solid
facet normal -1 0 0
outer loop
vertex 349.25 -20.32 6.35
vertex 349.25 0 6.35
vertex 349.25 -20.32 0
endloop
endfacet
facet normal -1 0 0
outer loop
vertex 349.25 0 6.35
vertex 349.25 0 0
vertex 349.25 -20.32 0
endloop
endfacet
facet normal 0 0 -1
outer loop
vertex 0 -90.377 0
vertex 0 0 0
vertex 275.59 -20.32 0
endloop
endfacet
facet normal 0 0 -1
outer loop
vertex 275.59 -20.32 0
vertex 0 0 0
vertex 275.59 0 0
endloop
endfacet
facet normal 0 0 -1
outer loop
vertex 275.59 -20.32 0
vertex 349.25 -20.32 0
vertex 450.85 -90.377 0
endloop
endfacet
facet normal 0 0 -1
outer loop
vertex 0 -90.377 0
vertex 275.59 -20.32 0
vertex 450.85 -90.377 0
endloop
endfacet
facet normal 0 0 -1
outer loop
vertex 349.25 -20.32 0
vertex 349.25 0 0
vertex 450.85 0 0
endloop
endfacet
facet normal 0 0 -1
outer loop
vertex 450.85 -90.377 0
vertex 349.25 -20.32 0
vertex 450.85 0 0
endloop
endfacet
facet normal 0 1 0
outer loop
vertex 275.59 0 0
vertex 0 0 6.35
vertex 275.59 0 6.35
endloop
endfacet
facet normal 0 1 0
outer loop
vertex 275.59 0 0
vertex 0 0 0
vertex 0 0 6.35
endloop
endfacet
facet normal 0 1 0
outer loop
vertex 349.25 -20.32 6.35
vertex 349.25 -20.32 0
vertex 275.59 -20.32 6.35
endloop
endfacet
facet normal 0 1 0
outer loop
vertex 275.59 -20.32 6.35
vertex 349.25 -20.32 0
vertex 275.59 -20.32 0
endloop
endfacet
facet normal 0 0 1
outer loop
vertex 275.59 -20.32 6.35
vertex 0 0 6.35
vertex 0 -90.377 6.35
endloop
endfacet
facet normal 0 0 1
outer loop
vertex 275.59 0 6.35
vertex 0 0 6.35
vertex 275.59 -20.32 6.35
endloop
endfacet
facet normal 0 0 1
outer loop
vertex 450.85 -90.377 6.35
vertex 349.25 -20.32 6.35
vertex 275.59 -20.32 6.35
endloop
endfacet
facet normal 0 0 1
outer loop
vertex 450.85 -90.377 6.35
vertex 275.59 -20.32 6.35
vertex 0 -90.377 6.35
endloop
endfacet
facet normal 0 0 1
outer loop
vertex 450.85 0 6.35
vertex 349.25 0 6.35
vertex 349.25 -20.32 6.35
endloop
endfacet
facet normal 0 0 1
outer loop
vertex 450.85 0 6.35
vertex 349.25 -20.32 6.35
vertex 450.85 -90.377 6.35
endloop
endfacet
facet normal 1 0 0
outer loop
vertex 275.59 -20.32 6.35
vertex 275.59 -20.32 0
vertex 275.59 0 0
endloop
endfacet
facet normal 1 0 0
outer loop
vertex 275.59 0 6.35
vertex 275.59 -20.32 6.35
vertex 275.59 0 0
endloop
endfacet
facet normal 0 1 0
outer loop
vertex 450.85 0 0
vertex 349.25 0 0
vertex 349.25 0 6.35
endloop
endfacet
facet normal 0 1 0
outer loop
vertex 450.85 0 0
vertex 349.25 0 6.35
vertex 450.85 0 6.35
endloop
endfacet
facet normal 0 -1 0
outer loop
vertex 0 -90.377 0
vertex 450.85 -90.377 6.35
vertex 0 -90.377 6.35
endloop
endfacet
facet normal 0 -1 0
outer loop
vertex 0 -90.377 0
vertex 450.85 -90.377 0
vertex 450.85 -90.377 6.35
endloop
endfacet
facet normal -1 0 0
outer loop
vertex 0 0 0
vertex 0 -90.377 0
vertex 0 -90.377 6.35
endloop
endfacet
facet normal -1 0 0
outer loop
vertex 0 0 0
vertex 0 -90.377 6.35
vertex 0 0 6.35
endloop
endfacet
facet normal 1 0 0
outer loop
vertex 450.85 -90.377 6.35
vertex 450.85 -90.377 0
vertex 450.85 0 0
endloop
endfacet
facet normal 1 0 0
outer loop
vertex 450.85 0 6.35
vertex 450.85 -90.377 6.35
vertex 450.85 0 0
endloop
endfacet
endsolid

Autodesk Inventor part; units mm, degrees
ref_plane "YZ Plane" through (0, 0, 0) normal (1, 0, 0) x (0, 1, 0)
ref_plane "XZ Plane" through (0, 0, 0) normal (0, 1, 0) x (-1, 0, 0)
ref_plane "XY Plane" through (0, 0, 0) normal (0, 0, 1) x (1, 0, 0)
ref_plane "Work Plane1" through (0, 0, 0) normal (0, 0, 1) x (1, 0, 0)
sketch "Sketch1" plane through (0, 0, 0) normal (0, 0, 1) x (1, 0, 0)
  line L0 (0, 0) -> (450.85, 0) construction
  line L1 (0, -6.35) -> (450.85, -6.35) construction
  line L2 (0, -84.027) -> (450.85, -84.027) construction
  line L3 (0, -90.377) -> (450.85, -90.377) construction
  line L4 (450.85, -90.377) -> (0, -90.377)
  line L5 (0, -90.377) -> (0, 0)
  arc A0 (30.6582, -6.35) -> (0, 0) centre (0, -77.185) ccw
  line L6 (450.85, -90.377) -> (450.85, 0)
  line L7 (349.25, 0) -> (349.25, -20.32)
  line L8 (349.25, -20.32) -> (275.59, -20.32)
  line L9 (275.59, -20.32) -> (275.59, 0)
  line L10 (0, 0) -> (275.59, 0)
  line L11 (349.25, 0) -> (450.85, 0)
  dimension "d2" = 101.6
  dimension "d3" = 73.66
  dimension "d4" = 20.32
extrude "Extrusion1" add sketch "Sketch1" along normal blind 6.35
properties part number "other top"
